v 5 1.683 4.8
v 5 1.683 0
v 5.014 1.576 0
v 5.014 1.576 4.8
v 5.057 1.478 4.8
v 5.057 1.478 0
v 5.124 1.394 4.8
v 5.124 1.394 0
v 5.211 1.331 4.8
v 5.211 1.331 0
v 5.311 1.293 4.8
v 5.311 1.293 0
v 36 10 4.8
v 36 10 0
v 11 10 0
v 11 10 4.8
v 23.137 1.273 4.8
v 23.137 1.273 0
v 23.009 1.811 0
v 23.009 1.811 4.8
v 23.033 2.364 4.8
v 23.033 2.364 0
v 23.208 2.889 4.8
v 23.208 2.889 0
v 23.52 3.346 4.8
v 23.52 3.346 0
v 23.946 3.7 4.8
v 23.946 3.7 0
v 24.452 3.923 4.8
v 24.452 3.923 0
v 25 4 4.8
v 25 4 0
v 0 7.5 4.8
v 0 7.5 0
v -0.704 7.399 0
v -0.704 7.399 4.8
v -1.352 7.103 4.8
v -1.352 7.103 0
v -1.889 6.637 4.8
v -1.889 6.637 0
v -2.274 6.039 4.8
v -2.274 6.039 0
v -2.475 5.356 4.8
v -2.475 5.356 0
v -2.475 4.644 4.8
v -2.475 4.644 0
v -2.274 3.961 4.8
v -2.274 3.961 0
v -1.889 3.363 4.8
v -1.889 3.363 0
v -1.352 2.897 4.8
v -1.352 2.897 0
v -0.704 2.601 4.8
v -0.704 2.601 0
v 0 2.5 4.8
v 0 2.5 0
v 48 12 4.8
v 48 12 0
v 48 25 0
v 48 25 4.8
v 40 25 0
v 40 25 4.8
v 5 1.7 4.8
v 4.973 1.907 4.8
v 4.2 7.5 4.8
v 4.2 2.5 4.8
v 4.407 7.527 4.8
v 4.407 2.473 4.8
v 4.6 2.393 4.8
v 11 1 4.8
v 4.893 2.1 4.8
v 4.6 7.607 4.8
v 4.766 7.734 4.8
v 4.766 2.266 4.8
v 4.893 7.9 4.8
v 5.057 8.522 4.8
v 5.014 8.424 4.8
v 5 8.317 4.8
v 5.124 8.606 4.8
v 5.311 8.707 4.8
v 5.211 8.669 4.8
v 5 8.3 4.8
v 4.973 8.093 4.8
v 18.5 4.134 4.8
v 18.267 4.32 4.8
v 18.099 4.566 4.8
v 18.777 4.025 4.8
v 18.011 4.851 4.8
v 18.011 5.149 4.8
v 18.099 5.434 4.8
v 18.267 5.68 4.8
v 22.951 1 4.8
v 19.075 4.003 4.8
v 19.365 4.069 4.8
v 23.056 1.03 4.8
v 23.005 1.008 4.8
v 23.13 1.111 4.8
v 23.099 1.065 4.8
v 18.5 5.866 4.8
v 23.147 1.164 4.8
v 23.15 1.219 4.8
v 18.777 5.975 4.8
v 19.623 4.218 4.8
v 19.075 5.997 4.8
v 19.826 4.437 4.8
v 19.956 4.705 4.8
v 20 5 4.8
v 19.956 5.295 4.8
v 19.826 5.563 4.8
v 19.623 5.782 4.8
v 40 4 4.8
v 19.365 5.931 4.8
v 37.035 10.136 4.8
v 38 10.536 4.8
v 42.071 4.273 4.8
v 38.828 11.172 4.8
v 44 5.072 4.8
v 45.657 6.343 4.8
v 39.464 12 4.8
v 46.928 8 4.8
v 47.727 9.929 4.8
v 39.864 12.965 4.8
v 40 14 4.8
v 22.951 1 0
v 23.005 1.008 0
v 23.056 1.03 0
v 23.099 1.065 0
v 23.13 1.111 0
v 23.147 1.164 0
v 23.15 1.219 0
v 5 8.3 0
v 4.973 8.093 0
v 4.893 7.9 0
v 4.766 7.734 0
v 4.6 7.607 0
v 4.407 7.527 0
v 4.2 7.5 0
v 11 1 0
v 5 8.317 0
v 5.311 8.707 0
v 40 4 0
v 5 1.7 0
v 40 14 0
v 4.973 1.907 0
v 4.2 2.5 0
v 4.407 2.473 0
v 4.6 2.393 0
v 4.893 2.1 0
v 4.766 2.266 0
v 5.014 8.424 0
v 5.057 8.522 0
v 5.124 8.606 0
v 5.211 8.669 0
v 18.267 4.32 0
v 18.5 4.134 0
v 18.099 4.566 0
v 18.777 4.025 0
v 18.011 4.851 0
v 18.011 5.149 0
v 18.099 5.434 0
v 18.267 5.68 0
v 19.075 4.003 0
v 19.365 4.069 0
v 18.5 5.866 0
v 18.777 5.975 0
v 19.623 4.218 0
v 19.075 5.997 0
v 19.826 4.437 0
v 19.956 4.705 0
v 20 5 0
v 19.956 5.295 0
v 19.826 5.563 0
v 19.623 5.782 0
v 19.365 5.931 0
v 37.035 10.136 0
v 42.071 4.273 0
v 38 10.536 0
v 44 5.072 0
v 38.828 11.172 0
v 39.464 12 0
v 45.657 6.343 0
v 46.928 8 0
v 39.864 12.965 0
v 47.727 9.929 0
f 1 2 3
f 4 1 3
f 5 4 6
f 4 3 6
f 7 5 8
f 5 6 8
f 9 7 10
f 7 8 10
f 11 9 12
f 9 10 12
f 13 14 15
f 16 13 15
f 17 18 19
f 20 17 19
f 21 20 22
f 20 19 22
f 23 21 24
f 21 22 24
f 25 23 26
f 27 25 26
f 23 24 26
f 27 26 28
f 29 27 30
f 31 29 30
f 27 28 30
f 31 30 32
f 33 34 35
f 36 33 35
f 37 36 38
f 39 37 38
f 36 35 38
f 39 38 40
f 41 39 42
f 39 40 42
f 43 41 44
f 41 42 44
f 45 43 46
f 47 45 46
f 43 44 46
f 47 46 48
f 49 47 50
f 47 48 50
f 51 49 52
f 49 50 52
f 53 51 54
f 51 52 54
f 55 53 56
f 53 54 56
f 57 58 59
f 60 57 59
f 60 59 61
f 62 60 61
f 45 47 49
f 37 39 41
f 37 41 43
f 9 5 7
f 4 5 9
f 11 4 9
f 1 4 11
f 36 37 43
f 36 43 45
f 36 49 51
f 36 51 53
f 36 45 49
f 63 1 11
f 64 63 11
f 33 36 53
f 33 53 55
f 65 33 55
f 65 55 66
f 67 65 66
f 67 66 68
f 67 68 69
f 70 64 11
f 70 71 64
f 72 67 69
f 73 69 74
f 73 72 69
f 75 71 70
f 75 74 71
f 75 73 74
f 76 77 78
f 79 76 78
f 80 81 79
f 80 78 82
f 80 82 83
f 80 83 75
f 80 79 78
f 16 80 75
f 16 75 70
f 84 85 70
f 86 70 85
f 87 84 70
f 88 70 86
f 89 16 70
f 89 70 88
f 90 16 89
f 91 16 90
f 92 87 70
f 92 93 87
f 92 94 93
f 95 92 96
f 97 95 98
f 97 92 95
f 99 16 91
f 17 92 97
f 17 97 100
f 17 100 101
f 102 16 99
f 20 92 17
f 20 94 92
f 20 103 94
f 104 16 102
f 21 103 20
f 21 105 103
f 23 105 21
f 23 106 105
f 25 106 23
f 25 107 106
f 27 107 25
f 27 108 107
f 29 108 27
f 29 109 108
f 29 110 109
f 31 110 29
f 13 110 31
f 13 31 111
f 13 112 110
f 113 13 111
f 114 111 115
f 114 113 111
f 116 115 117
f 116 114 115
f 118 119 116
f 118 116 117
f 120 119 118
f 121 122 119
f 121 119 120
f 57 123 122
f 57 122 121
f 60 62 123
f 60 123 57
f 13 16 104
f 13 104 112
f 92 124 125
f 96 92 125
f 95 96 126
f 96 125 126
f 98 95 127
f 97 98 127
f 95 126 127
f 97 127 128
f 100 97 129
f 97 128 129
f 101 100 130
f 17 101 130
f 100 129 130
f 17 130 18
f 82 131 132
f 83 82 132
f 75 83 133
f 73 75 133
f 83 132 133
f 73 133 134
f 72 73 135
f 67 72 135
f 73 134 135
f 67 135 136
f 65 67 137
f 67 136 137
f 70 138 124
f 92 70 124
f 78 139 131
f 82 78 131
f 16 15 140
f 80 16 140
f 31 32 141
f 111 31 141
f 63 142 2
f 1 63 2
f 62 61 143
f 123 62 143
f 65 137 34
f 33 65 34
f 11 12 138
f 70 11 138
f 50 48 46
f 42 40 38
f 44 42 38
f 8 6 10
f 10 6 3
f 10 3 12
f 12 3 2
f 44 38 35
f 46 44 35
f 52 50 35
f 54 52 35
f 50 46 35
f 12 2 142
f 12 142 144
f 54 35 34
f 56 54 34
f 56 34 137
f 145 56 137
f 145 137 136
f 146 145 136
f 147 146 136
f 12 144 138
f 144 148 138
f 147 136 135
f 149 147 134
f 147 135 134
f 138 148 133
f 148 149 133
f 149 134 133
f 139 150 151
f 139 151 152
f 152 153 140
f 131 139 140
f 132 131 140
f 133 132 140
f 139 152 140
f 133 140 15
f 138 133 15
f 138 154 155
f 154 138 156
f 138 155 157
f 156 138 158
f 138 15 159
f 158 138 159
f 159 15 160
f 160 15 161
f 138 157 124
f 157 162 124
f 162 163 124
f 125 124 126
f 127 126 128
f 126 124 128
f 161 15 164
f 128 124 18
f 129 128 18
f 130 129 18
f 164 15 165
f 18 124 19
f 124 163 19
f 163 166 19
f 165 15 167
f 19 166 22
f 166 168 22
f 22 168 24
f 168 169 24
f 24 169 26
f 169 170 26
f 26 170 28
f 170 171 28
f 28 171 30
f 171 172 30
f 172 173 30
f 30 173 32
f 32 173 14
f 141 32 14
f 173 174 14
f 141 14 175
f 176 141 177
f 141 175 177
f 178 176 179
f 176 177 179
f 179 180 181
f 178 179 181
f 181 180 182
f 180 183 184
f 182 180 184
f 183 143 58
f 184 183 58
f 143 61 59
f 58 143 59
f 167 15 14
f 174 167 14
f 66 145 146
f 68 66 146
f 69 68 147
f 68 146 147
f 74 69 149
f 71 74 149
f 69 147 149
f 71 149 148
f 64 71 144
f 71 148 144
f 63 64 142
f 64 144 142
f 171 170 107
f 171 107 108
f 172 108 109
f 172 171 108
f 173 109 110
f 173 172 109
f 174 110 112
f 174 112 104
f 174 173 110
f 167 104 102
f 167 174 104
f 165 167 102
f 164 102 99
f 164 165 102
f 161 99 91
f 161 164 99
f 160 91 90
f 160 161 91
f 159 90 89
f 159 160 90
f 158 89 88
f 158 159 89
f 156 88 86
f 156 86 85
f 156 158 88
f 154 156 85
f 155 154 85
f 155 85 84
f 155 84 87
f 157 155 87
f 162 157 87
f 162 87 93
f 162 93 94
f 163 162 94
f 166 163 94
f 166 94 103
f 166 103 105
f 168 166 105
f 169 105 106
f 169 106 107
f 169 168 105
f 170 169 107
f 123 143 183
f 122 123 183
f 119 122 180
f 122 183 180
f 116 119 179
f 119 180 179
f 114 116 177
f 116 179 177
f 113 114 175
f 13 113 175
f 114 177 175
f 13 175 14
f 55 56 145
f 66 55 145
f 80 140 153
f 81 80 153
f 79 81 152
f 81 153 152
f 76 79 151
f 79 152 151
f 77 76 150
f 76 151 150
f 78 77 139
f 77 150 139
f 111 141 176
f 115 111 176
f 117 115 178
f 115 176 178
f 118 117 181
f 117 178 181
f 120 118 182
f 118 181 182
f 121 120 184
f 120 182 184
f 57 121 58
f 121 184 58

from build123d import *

# Parameters (mm, degrees)
F0_R     = 1
F1_DEPTH = 4.8


with BuildPart() as f1:
    # F0 (on Top) → F1 (new body)
    with BuildSketch(Plane.XY):
        with BuildLine():
            ThreePointArc((40, 4), (45.656854, 6.343146), (48, 12))
            Line((48, 12), (48, 25))
            Line((48, 25), (40, 25))
            Line((40, 25), (40, 14))
            ThreePointArc((40, 14), (38.828427, 11.171573), (36, 10))
            Line((36, 10), (11, 10))
            Line((11, 10), (5.311352, 8.707125))
            ThreePointArc((5.311352, 8.707125), (5.087383, 8.566612), (5, 8.317072))
            Line((5, 8.317072), (5, 8.3))
            ThreePointArc((5, 8.3), (4.765685, 7.734315), (4.2, 7.5))
            Line((4.2, 7.5), (0, 7.5))
            ThreePointArc((0, 7.5), (-2.5, 5), (0, 2.5))
            Line((0, 2.5), (4.2, 2.5))
            ThreePointArc((4.2, 2.5), (4.765685, 2.265685), (5, 1.7))
            Line((5, 1.7), (5, 1.682928))
            ThreePointArc((5, 1.682928), (5.087383, 1.433388), (5.311352, 1.292875))
            Line((5.311352, 1.292875), (11, 1))
            Line((11, 1), (22.95061, 1))
            ThreePointArc((22.95061, 1), (23.115754, 1.087185), (23.136918, 1.272727))
            ThreePointArc((23.136918, 1.272727), (23.348554, 3.128152), (25, 4))
            Line((25, 4), (40, 4))
        make_face()
        with Locations((19, 5)):
            Circle(F0_R, mode=Mode.SUBTRACT)
    extrude(amount=F1_DEPTH)


solid = f1.part
